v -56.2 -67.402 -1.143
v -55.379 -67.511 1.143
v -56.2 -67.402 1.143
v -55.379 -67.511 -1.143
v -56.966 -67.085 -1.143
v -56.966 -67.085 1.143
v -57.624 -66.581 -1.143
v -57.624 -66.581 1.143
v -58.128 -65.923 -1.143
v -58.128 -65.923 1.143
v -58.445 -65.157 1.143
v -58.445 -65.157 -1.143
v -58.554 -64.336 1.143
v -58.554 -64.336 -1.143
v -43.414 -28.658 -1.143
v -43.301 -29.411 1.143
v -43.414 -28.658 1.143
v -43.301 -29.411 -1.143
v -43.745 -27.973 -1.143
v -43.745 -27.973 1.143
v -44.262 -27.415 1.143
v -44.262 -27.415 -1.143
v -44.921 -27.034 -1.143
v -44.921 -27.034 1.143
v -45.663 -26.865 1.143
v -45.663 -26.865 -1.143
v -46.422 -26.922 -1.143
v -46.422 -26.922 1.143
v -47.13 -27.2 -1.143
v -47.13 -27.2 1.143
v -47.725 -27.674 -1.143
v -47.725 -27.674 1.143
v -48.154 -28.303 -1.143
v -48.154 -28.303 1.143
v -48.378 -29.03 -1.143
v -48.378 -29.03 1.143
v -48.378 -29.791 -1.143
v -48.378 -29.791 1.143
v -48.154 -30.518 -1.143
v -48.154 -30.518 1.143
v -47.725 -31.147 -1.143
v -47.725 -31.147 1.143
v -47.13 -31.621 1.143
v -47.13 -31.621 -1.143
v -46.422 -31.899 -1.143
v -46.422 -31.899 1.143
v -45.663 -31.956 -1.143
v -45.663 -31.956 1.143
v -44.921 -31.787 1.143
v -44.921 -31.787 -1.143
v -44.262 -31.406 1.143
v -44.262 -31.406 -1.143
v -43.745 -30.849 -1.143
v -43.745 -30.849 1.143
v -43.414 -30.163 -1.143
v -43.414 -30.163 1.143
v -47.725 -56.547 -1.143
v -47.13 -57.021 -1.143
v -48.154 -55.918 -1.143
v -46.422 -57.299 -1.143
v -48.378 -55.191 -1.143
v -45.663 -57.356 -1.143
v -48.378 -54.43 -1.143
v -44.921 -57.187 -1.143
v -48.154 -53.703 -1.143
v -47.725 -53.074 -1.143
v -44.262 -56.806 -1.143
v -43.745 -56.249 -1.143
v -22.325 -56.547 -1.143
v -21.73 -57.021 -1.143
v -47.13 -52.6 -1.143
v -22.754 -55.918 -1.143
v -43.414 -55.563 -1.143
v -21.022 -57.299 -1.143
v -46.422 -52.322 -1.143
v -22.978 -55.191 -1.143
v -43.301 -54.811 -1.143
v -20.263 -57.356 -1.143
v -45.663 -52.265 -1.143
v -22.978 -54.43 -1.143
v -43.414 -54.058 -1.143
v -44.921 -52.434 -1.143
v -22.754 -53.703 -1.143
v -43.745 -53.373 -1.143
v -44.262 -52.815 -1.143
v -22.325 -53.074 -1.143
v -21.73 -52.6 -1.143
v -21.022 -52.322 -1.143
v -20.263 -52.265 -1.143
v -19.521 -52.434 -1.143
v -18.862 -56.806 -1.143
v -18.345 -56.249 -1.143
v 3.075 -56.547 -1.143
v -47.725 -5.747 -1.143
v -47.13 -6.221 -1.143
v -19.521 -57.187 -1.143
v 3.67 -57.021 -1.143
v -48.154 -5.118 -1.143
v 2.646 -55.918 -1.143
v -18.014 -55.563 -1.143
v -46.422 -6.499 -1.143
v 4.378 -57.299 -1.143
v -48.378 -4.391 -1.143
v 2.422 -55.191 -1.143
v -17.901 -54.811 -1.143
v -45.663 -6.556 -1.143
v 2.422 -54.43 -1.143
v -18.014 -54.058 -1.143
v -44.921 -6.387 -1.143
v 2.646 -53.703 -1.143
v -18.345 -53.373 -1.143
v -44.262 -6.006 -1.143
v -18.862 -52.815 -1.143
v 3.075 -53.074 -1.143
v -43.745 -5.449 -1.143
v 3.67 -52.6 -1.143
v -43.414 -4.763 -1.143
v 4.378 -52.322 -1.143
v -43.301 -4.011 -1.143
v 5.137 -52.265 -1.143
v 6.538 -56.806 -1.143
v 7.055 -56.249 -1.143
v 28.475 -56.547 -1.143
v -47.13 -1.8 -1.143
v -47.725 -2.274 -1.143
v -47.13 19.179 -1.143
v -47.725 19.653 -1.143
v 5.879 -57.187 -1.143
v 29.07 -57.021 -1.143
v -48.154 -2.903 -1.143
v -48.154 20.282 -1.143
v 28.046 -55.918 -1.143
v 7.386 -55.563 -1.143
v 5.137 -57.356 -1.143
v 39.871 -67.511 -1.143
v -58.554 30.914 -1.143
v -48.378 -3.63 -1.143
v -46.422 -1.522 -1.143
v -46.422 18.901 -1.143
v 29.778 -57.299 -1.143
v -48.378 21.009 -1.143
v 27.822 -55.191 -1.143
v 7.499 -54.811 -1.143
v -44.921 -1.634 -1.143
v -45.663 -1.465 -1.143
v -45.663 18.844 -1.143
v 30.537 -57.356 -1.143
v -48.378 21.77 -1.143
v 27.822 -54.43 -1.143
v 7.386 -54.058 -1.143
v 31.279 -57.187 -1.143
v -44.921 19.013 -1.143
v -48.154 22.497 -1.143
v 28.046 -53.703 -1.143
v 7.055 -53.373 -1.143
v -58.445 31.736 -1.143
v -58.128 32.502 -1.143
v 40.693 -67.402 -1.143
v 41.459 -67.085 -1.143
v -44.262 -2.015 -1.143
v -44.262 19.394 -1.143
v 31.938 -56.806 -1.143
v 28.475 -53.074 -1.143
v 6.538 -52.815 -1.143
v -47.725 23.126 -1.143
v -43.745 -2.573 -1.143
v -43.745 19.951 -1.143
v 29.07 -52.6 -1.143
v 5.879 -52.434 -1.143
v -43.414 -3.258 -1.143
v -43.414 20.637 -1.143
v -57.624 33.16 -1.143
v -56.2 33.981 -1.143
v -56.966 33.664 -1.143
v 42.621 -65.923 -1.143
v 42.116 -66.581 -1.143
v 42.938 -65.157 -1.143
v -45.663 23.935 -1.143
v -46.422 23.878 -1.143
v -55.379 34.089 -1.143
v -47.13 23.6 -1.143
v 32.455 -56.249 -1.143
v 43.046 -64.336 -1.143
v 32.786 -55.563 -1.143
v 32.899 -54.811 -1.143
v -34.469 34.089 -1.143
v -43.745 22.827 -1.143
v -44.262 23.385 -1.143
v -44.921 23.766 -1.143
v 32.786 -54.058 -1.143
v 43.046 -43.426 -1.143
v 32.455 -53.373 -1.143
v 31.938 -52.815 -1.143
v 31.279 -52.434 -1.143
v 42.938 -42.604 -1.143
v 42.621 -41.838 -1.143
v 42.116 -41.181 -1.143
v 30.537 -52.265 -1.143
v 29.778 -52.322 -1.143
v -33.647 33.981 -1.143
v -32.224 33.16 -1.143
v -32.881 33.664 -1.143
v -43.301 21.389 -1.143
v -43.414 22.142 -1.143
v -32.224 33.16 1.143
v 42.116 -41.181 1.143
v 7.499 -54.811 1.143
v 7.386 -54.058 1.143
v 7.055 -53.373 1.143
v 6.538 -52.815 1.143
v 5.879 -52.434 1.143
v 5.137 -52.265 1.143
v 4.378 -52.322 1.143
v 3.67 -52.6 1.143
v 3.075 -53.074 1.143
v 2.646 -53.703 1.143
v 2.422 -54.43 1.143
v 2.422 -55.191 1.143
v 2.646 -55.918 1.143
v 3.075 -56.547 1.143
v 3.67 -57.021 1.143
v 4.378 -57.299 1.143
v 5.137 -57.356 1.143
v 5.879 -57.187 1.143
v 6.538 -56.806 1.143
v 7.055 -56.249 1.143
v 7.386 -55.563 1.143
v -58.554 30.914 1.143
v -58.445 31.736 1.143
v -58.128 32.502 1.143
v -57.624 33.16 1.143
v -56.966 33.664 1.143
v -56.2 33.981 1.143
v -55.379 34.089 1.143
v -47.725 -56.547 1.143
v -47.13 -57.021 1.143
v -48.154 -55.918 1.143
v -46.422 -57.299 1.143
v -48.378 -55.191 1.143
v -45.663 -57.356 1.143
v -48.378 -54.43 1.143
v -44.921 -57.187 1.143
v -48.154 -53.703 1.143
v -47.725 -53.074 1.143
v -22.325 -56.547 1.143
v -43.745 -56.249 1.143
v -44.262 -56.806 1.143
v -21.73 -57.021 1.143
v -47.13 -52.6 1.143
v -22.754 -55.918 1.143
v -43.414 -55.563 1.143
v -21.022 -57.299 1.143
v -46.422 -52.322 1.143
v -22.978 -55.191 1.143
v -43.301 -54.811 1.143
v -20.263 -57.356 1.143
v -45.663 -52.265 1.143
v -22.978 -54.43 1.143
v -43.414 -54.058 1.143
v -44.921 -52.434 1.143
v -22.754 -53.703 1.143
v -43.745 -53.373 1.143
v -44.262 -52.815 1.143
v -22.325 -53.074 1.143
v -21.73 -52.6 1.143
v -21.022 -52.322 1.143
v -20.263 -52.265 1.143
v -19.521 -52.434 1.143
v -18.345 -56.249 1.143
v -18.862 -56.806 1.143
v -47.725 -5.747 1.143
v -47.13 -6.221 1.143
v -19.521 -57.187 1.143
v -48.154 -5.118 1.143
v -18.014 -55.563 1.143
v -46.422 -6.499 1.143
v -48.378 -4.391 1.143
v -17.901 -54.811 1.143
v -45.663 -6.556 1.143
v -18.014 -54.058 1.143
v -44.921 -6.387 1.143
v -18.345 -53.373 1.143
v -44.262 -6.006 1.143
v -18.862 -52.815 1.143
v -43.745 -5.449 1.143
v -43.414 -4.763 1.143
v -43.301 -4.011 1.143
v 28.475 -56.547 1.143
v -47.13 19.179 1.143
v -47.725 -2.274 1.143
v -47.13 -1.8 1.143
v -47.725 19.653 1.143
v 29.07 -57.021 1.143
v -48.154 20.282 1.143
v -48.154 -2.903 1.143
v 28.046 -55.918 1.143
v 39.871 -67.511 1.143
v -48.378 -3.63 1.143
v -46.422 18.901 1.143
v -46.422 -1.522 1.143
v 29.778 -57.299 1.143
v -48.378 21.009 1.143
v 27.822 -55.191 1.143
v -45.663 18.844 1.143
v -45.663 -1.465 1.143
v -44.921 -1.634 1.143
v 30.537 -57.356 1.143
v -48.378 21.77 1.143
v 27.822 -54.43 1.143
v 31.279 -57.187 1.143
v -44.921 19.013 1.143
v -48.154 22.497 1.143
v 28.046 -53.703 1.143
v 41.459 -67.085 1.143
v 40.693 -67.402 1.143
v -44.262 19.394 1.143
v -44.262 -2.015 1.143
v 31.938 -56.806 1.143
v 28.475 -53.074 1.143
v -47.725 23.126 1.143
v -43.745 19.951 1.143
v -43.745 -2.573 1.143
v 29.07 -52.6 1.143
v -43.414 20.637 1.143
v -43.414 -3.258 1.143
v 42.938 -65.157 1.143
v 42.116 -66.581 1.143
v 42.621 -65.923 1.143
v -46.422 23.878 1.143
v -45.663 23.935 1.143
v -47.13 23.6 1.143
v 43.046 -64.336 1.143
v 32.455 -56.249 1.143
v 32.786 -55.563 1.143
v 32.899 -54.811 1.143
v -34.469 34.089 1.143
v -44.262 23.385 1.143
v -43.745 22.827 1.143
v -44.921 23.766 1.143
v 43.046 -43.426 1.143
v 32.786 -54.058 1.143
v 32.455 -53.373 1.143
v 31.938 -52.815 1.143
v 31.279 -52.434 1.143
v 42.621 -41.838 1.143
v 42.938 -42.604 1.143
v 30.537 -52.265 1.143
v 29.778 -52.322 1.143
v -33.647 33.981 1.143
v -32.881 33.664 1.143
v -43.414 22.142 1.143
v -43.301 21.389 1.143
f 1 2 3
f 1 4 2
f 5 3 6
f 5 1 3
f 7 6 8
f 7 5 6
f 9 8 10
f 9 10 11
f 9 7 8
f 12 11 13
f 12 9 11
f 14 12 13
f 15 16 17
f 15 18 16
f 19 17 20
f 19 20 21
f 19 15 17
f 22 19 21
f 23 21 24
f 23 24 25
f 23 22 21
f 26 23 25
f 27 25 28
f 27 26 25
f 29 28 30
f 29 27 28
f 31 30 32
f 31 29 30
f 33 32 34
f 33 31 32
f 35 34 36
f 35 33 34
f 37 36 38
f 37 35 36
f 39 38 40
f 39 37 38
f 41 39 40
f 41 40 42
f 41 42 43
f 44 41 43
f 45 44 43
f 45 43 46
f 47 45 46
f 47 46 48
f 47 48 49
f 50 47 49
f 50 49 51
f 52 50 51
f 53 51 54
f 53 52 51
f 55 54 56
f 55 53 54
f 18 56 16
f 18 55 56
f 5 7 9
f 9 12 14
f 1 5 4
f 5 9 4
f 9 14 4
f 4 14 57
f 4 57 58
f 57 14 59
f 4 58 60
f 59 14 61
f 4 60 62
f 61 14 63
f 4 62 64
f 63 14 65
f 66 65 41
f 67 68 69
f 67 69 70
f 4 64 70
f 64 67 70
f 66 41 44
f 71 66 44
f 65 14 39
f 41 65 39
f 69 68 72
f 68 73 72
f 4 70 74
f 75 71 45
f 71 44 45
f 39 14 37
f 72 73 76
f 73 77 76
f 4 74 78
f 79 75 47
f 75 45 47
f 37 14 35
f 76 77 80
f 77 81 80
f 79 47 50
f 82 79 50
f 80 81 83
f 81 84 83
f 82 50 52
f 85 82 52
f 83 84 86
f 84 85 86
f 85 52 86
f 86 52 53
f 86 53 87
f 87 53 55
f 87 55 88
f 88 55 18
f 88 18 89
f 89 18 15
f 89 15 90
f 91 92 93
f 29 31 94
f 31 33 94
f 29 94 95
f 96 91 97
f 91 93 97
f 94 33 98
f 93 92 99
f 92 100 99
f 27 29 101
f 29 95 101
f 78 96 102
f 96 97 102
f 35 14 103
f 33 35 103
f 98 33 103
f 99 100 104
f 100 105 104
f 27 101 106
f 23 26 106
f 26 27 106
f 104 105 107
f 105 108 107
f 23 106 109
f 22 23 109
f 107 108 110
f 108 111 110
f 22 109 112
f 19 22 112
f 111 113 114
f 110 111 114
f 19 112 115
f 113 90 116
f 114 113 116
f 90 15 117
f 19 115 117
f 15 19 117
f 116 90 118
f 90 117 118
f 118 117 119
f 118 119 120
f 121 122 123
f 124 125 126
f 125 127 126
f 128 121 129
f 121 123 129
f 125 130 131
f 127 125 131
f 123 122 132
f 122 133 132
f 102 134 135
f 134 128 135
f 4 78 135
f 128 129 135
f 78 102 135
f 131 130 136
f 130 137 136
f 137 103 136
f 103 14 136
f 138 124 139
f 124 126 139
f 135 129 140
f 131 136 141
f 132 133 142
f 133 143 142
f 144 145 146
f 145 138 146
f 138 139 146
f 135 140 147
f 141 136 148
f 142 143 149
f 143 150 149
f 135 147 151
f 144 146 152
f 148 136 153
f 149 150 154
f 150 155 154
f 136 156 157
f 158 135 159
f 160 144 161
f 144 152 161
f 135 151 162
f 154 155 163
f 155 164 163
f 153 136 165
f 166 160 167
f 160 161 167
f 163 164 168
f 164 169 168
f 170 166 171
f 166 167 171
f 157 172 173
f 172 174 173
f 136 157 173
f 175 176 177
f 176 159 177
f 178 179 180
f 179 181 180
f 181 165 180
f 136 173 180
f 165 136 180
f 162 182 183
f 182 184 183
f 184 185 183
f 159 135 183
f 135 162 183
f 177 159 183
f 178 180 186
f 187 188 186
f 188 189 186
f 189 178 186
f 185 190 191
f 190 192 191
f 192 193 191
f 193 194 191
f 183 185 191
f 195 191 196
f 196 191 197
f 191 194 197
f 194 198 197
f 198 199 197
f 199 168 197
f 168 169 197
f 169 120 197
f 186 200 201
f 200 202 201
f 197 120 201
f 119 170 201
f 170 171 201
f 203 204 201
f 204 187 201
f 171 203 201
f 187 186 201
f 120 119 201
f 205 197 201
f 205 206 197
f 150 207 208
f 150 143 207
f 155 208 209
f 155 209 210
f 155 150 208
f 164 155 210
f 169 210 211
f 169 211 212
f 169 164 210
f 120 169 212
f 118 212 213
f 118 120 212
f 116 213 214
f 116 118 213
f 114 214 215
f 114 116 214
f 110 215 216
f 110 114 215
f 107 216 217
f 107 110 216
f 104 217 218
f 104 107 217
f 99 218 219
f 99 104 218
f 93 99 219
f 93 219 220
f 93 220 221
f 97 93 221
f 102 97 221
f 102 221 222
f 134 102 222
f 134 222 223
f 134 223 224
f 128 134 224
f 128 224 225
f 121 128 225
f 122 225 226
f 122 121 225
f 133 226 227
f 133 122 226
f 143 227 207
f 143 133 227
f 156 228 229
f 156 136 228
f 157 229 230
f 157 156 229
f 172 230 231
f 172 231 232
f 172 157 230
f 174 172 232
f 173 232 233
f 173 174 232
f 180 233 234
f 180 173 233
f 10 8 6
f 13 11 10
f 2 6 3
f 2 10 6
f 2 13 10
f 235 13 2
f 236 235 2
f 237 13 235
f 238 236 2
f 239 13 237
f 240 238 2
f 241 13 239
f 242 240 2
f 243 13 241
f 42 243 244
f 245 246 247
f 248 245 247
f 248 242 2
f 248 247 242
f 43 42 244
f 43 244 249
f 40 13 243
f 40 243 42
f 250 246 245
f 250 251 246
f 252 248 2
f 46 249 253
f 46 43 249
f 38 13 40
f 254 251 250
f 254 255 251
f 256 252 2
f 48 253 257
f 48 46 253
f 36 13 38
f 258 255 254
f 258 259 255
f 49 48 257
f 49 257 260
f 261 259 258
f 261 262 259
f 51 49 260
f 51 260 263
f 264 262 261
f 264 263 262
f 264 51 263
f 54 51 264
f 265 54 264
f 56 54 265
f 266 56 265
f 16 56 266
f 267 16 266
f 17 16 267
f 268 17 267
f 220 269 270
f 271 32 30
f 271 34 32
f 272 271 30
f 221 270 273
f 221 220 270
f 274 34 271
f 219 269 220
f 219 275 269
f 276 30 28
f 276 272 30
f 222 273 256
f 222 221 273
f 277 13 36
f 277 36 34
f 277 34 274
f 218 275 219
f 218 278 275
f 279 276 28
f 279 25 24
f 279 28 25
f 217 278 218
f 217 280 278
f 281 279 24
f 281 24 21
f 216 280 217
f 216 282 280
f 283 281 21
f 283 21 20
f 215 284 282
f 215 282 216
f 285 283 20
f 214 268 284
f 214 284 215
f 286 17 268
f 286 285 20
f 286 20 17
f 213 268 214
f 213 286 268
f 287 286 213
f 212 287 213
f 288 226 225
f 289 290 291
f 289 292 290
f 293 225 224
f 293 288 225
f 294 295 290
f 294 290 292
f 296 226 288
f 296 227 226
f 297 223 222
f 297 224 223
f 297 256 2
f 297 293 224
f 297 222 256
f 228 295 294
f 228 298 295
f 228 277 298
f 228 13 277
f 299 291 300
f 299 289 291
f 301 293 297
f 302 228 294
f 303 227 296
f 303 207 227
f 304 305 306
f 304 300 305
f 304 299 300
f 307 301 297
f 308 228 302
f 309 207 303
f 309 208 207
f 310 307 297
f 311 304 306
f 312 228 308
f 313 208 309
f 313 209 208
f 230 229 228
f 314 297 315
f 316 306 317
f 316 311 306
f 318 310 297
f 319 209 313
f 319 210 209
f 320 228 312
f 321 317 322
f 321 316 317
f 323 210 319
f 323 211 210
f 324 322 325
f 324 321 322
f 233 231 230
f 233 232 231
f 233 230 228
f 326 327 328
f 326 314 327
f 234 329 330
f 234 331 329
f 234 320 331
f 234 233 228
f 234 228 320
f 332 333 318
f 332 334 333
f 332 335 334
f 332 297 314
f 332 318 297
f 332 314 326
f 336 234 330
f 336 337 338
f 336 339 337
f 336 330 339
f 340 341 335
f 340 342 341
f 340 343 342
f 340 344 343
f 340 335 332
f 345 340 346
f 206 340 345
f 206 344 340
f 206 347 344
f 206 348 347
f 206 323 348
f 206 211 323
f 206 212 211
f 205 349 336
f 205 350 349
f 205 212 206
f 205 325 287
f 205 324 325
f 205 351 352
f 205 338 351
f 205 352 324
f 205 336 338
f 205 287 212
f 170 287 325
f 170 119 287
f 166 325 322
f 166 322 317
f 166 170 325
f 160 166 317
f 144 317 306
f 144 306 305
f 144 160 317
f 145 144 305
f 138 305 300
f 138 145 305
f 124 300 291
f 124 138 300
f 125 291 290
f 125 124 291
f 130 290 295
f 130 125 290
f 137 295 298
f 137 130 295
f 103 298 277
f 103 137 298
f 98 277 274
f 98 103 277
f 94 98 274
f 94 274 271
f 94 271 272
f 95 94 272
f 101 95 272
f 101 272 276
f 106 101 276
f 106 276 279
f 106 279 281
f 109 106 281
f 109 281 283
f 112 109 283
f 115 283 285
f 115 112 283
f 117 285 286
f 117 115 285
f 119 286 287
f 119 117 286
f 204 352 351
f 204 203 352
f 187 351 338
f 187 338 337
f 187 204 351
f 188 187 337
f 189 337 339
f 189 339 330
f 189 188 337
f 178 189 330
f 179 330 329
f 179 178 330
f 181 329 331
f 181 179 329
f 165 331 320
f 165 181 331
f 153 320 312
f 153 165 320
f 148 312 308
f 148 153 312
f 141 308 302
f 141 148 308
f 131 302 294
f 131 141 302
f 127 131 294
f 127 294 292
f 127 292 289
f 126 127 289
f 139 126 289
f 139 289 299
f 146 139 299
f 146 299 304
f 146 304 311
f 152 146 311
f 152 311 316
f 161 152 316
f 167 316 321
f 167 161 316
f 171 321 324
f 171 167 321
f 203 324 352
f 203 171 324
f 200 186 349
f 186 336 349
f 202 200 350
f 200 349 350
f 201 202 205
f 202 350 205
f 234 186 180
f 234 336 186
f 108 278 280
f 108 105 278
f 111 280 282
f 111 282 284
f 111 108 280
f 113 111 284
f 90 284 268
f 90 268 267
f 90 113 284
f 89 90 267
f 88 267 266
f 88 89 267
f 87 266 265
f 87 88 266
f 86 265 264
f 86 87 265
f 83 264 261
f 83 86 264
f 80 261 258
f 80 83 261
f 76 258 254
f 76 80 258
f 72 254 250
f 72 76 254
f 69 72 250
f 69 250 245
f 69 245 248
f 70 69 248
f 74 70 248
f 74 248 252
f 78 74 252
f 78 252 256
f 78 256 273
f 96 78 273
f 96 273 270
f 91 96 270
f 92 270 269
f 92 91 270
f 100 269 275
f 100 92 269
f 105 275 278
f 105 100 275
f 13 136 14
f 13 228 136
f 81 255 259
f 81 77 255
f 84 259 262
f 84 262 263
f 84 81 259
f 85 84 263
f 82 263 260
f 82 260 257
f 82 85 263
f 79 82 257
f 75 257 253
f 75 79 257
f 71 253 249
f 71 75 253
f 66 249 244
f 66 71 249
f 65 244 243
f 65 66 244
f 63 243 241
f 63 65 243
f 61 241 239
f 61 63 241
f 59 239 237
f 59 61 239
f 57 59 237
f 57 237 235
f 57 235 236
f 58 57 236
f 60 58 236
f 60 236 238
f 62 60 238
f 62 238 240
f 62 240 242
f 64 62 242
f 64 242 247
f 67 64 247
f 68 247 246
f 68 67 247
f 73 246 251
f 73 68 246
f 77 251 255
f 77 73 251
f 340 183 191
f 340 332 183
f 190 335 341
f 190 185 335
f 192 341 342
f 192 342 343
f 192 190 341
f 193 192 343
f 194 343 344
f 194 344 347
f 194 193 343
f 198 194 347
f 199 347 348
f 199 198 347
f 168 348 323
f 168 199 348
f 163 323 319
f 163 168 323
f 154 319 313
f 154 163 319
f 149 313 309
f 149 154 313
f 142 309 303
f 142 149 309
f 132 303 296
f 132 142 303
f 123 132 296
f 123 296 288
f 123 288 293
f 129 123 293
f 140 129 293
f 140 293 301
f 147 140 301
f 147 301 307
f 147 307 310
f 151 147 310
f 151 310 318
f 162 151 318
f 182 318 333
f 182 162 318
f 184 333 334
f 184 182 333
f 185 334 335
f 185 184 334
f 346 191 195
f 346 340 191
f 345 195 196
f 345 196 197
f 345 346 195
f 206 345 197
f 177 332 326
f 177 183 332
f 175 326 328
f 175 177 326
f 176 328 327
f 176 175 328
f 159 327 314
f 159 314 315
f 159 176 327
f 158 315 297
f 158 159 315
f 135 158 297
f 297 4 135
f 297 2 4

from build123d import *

# Parameters (mm, degrees)
SKETCH1_R           = 2.5527
BOSS_EXTRUDE1_DEPTH = 1.143
FILLET1_R           = 3.175


with BuildPart() as part:
    # Sketch1 → Boss-Extrude1 (new, symmetric)
    with BuildSketch(Plane.XY):
        Polygon((43.046315789, -67.510526316), (43.046315789, -42.110526316), (-33.153684211, 34.089473684), (-58.553684211, 34.089473684), (-58.553684211, -67.510526316), align=None)
        with Locations((-45.853684211, 21.389473684)):
            Circle(SKETCH1_R, mode=Mode.SUBTRACT)
        with Locations((-45.853684211, -4.010526316)):
            Circle(SKETCH1_R, mode=Mode.SUBTRACT)
        with Locations((-45.853684211, -29.410526316)):
            Circle(SKETCH1_R, mode=Mode.SUBTRACT)
        with Locations((-45.853684211, -54.810526316)):
            Circle(SKETCH1_R, mode=Mode.SUBTRACT)
        with Locations((-20.453684211, -54.810526316)):
            Circle(SKETCH1_R, mode=Mode.SUBTRACT)
        with Locations((4.946315789, -54.810526316)):
            Circle(SKETCH1_R, mode=Mode.SUBTRACT)
        with Locations((30.346315789, -54.810526316)):
            Circle(SKETCH1_R, mode=Mode.SUBTRACT)
    extrude(amount=BOSS_EXTRUDE1_DEPTH, both=True)

    # Fillet1
    fillet1_edges = [part.edges().sort_by_distance(p)[0] for p in [
        (-58.553684211, 34.089473684, 0),
        (-33.153684211, 34.089473684, 0),
        (43.046315789, -42.110526316, 0),
        (43.046315789, -67.510526316, 0),
        (-58.553684211, -67.510526316, 0),
    ]]
    fillet(fillet1_edges, radius=FILLET1_R)


solid = part.part
